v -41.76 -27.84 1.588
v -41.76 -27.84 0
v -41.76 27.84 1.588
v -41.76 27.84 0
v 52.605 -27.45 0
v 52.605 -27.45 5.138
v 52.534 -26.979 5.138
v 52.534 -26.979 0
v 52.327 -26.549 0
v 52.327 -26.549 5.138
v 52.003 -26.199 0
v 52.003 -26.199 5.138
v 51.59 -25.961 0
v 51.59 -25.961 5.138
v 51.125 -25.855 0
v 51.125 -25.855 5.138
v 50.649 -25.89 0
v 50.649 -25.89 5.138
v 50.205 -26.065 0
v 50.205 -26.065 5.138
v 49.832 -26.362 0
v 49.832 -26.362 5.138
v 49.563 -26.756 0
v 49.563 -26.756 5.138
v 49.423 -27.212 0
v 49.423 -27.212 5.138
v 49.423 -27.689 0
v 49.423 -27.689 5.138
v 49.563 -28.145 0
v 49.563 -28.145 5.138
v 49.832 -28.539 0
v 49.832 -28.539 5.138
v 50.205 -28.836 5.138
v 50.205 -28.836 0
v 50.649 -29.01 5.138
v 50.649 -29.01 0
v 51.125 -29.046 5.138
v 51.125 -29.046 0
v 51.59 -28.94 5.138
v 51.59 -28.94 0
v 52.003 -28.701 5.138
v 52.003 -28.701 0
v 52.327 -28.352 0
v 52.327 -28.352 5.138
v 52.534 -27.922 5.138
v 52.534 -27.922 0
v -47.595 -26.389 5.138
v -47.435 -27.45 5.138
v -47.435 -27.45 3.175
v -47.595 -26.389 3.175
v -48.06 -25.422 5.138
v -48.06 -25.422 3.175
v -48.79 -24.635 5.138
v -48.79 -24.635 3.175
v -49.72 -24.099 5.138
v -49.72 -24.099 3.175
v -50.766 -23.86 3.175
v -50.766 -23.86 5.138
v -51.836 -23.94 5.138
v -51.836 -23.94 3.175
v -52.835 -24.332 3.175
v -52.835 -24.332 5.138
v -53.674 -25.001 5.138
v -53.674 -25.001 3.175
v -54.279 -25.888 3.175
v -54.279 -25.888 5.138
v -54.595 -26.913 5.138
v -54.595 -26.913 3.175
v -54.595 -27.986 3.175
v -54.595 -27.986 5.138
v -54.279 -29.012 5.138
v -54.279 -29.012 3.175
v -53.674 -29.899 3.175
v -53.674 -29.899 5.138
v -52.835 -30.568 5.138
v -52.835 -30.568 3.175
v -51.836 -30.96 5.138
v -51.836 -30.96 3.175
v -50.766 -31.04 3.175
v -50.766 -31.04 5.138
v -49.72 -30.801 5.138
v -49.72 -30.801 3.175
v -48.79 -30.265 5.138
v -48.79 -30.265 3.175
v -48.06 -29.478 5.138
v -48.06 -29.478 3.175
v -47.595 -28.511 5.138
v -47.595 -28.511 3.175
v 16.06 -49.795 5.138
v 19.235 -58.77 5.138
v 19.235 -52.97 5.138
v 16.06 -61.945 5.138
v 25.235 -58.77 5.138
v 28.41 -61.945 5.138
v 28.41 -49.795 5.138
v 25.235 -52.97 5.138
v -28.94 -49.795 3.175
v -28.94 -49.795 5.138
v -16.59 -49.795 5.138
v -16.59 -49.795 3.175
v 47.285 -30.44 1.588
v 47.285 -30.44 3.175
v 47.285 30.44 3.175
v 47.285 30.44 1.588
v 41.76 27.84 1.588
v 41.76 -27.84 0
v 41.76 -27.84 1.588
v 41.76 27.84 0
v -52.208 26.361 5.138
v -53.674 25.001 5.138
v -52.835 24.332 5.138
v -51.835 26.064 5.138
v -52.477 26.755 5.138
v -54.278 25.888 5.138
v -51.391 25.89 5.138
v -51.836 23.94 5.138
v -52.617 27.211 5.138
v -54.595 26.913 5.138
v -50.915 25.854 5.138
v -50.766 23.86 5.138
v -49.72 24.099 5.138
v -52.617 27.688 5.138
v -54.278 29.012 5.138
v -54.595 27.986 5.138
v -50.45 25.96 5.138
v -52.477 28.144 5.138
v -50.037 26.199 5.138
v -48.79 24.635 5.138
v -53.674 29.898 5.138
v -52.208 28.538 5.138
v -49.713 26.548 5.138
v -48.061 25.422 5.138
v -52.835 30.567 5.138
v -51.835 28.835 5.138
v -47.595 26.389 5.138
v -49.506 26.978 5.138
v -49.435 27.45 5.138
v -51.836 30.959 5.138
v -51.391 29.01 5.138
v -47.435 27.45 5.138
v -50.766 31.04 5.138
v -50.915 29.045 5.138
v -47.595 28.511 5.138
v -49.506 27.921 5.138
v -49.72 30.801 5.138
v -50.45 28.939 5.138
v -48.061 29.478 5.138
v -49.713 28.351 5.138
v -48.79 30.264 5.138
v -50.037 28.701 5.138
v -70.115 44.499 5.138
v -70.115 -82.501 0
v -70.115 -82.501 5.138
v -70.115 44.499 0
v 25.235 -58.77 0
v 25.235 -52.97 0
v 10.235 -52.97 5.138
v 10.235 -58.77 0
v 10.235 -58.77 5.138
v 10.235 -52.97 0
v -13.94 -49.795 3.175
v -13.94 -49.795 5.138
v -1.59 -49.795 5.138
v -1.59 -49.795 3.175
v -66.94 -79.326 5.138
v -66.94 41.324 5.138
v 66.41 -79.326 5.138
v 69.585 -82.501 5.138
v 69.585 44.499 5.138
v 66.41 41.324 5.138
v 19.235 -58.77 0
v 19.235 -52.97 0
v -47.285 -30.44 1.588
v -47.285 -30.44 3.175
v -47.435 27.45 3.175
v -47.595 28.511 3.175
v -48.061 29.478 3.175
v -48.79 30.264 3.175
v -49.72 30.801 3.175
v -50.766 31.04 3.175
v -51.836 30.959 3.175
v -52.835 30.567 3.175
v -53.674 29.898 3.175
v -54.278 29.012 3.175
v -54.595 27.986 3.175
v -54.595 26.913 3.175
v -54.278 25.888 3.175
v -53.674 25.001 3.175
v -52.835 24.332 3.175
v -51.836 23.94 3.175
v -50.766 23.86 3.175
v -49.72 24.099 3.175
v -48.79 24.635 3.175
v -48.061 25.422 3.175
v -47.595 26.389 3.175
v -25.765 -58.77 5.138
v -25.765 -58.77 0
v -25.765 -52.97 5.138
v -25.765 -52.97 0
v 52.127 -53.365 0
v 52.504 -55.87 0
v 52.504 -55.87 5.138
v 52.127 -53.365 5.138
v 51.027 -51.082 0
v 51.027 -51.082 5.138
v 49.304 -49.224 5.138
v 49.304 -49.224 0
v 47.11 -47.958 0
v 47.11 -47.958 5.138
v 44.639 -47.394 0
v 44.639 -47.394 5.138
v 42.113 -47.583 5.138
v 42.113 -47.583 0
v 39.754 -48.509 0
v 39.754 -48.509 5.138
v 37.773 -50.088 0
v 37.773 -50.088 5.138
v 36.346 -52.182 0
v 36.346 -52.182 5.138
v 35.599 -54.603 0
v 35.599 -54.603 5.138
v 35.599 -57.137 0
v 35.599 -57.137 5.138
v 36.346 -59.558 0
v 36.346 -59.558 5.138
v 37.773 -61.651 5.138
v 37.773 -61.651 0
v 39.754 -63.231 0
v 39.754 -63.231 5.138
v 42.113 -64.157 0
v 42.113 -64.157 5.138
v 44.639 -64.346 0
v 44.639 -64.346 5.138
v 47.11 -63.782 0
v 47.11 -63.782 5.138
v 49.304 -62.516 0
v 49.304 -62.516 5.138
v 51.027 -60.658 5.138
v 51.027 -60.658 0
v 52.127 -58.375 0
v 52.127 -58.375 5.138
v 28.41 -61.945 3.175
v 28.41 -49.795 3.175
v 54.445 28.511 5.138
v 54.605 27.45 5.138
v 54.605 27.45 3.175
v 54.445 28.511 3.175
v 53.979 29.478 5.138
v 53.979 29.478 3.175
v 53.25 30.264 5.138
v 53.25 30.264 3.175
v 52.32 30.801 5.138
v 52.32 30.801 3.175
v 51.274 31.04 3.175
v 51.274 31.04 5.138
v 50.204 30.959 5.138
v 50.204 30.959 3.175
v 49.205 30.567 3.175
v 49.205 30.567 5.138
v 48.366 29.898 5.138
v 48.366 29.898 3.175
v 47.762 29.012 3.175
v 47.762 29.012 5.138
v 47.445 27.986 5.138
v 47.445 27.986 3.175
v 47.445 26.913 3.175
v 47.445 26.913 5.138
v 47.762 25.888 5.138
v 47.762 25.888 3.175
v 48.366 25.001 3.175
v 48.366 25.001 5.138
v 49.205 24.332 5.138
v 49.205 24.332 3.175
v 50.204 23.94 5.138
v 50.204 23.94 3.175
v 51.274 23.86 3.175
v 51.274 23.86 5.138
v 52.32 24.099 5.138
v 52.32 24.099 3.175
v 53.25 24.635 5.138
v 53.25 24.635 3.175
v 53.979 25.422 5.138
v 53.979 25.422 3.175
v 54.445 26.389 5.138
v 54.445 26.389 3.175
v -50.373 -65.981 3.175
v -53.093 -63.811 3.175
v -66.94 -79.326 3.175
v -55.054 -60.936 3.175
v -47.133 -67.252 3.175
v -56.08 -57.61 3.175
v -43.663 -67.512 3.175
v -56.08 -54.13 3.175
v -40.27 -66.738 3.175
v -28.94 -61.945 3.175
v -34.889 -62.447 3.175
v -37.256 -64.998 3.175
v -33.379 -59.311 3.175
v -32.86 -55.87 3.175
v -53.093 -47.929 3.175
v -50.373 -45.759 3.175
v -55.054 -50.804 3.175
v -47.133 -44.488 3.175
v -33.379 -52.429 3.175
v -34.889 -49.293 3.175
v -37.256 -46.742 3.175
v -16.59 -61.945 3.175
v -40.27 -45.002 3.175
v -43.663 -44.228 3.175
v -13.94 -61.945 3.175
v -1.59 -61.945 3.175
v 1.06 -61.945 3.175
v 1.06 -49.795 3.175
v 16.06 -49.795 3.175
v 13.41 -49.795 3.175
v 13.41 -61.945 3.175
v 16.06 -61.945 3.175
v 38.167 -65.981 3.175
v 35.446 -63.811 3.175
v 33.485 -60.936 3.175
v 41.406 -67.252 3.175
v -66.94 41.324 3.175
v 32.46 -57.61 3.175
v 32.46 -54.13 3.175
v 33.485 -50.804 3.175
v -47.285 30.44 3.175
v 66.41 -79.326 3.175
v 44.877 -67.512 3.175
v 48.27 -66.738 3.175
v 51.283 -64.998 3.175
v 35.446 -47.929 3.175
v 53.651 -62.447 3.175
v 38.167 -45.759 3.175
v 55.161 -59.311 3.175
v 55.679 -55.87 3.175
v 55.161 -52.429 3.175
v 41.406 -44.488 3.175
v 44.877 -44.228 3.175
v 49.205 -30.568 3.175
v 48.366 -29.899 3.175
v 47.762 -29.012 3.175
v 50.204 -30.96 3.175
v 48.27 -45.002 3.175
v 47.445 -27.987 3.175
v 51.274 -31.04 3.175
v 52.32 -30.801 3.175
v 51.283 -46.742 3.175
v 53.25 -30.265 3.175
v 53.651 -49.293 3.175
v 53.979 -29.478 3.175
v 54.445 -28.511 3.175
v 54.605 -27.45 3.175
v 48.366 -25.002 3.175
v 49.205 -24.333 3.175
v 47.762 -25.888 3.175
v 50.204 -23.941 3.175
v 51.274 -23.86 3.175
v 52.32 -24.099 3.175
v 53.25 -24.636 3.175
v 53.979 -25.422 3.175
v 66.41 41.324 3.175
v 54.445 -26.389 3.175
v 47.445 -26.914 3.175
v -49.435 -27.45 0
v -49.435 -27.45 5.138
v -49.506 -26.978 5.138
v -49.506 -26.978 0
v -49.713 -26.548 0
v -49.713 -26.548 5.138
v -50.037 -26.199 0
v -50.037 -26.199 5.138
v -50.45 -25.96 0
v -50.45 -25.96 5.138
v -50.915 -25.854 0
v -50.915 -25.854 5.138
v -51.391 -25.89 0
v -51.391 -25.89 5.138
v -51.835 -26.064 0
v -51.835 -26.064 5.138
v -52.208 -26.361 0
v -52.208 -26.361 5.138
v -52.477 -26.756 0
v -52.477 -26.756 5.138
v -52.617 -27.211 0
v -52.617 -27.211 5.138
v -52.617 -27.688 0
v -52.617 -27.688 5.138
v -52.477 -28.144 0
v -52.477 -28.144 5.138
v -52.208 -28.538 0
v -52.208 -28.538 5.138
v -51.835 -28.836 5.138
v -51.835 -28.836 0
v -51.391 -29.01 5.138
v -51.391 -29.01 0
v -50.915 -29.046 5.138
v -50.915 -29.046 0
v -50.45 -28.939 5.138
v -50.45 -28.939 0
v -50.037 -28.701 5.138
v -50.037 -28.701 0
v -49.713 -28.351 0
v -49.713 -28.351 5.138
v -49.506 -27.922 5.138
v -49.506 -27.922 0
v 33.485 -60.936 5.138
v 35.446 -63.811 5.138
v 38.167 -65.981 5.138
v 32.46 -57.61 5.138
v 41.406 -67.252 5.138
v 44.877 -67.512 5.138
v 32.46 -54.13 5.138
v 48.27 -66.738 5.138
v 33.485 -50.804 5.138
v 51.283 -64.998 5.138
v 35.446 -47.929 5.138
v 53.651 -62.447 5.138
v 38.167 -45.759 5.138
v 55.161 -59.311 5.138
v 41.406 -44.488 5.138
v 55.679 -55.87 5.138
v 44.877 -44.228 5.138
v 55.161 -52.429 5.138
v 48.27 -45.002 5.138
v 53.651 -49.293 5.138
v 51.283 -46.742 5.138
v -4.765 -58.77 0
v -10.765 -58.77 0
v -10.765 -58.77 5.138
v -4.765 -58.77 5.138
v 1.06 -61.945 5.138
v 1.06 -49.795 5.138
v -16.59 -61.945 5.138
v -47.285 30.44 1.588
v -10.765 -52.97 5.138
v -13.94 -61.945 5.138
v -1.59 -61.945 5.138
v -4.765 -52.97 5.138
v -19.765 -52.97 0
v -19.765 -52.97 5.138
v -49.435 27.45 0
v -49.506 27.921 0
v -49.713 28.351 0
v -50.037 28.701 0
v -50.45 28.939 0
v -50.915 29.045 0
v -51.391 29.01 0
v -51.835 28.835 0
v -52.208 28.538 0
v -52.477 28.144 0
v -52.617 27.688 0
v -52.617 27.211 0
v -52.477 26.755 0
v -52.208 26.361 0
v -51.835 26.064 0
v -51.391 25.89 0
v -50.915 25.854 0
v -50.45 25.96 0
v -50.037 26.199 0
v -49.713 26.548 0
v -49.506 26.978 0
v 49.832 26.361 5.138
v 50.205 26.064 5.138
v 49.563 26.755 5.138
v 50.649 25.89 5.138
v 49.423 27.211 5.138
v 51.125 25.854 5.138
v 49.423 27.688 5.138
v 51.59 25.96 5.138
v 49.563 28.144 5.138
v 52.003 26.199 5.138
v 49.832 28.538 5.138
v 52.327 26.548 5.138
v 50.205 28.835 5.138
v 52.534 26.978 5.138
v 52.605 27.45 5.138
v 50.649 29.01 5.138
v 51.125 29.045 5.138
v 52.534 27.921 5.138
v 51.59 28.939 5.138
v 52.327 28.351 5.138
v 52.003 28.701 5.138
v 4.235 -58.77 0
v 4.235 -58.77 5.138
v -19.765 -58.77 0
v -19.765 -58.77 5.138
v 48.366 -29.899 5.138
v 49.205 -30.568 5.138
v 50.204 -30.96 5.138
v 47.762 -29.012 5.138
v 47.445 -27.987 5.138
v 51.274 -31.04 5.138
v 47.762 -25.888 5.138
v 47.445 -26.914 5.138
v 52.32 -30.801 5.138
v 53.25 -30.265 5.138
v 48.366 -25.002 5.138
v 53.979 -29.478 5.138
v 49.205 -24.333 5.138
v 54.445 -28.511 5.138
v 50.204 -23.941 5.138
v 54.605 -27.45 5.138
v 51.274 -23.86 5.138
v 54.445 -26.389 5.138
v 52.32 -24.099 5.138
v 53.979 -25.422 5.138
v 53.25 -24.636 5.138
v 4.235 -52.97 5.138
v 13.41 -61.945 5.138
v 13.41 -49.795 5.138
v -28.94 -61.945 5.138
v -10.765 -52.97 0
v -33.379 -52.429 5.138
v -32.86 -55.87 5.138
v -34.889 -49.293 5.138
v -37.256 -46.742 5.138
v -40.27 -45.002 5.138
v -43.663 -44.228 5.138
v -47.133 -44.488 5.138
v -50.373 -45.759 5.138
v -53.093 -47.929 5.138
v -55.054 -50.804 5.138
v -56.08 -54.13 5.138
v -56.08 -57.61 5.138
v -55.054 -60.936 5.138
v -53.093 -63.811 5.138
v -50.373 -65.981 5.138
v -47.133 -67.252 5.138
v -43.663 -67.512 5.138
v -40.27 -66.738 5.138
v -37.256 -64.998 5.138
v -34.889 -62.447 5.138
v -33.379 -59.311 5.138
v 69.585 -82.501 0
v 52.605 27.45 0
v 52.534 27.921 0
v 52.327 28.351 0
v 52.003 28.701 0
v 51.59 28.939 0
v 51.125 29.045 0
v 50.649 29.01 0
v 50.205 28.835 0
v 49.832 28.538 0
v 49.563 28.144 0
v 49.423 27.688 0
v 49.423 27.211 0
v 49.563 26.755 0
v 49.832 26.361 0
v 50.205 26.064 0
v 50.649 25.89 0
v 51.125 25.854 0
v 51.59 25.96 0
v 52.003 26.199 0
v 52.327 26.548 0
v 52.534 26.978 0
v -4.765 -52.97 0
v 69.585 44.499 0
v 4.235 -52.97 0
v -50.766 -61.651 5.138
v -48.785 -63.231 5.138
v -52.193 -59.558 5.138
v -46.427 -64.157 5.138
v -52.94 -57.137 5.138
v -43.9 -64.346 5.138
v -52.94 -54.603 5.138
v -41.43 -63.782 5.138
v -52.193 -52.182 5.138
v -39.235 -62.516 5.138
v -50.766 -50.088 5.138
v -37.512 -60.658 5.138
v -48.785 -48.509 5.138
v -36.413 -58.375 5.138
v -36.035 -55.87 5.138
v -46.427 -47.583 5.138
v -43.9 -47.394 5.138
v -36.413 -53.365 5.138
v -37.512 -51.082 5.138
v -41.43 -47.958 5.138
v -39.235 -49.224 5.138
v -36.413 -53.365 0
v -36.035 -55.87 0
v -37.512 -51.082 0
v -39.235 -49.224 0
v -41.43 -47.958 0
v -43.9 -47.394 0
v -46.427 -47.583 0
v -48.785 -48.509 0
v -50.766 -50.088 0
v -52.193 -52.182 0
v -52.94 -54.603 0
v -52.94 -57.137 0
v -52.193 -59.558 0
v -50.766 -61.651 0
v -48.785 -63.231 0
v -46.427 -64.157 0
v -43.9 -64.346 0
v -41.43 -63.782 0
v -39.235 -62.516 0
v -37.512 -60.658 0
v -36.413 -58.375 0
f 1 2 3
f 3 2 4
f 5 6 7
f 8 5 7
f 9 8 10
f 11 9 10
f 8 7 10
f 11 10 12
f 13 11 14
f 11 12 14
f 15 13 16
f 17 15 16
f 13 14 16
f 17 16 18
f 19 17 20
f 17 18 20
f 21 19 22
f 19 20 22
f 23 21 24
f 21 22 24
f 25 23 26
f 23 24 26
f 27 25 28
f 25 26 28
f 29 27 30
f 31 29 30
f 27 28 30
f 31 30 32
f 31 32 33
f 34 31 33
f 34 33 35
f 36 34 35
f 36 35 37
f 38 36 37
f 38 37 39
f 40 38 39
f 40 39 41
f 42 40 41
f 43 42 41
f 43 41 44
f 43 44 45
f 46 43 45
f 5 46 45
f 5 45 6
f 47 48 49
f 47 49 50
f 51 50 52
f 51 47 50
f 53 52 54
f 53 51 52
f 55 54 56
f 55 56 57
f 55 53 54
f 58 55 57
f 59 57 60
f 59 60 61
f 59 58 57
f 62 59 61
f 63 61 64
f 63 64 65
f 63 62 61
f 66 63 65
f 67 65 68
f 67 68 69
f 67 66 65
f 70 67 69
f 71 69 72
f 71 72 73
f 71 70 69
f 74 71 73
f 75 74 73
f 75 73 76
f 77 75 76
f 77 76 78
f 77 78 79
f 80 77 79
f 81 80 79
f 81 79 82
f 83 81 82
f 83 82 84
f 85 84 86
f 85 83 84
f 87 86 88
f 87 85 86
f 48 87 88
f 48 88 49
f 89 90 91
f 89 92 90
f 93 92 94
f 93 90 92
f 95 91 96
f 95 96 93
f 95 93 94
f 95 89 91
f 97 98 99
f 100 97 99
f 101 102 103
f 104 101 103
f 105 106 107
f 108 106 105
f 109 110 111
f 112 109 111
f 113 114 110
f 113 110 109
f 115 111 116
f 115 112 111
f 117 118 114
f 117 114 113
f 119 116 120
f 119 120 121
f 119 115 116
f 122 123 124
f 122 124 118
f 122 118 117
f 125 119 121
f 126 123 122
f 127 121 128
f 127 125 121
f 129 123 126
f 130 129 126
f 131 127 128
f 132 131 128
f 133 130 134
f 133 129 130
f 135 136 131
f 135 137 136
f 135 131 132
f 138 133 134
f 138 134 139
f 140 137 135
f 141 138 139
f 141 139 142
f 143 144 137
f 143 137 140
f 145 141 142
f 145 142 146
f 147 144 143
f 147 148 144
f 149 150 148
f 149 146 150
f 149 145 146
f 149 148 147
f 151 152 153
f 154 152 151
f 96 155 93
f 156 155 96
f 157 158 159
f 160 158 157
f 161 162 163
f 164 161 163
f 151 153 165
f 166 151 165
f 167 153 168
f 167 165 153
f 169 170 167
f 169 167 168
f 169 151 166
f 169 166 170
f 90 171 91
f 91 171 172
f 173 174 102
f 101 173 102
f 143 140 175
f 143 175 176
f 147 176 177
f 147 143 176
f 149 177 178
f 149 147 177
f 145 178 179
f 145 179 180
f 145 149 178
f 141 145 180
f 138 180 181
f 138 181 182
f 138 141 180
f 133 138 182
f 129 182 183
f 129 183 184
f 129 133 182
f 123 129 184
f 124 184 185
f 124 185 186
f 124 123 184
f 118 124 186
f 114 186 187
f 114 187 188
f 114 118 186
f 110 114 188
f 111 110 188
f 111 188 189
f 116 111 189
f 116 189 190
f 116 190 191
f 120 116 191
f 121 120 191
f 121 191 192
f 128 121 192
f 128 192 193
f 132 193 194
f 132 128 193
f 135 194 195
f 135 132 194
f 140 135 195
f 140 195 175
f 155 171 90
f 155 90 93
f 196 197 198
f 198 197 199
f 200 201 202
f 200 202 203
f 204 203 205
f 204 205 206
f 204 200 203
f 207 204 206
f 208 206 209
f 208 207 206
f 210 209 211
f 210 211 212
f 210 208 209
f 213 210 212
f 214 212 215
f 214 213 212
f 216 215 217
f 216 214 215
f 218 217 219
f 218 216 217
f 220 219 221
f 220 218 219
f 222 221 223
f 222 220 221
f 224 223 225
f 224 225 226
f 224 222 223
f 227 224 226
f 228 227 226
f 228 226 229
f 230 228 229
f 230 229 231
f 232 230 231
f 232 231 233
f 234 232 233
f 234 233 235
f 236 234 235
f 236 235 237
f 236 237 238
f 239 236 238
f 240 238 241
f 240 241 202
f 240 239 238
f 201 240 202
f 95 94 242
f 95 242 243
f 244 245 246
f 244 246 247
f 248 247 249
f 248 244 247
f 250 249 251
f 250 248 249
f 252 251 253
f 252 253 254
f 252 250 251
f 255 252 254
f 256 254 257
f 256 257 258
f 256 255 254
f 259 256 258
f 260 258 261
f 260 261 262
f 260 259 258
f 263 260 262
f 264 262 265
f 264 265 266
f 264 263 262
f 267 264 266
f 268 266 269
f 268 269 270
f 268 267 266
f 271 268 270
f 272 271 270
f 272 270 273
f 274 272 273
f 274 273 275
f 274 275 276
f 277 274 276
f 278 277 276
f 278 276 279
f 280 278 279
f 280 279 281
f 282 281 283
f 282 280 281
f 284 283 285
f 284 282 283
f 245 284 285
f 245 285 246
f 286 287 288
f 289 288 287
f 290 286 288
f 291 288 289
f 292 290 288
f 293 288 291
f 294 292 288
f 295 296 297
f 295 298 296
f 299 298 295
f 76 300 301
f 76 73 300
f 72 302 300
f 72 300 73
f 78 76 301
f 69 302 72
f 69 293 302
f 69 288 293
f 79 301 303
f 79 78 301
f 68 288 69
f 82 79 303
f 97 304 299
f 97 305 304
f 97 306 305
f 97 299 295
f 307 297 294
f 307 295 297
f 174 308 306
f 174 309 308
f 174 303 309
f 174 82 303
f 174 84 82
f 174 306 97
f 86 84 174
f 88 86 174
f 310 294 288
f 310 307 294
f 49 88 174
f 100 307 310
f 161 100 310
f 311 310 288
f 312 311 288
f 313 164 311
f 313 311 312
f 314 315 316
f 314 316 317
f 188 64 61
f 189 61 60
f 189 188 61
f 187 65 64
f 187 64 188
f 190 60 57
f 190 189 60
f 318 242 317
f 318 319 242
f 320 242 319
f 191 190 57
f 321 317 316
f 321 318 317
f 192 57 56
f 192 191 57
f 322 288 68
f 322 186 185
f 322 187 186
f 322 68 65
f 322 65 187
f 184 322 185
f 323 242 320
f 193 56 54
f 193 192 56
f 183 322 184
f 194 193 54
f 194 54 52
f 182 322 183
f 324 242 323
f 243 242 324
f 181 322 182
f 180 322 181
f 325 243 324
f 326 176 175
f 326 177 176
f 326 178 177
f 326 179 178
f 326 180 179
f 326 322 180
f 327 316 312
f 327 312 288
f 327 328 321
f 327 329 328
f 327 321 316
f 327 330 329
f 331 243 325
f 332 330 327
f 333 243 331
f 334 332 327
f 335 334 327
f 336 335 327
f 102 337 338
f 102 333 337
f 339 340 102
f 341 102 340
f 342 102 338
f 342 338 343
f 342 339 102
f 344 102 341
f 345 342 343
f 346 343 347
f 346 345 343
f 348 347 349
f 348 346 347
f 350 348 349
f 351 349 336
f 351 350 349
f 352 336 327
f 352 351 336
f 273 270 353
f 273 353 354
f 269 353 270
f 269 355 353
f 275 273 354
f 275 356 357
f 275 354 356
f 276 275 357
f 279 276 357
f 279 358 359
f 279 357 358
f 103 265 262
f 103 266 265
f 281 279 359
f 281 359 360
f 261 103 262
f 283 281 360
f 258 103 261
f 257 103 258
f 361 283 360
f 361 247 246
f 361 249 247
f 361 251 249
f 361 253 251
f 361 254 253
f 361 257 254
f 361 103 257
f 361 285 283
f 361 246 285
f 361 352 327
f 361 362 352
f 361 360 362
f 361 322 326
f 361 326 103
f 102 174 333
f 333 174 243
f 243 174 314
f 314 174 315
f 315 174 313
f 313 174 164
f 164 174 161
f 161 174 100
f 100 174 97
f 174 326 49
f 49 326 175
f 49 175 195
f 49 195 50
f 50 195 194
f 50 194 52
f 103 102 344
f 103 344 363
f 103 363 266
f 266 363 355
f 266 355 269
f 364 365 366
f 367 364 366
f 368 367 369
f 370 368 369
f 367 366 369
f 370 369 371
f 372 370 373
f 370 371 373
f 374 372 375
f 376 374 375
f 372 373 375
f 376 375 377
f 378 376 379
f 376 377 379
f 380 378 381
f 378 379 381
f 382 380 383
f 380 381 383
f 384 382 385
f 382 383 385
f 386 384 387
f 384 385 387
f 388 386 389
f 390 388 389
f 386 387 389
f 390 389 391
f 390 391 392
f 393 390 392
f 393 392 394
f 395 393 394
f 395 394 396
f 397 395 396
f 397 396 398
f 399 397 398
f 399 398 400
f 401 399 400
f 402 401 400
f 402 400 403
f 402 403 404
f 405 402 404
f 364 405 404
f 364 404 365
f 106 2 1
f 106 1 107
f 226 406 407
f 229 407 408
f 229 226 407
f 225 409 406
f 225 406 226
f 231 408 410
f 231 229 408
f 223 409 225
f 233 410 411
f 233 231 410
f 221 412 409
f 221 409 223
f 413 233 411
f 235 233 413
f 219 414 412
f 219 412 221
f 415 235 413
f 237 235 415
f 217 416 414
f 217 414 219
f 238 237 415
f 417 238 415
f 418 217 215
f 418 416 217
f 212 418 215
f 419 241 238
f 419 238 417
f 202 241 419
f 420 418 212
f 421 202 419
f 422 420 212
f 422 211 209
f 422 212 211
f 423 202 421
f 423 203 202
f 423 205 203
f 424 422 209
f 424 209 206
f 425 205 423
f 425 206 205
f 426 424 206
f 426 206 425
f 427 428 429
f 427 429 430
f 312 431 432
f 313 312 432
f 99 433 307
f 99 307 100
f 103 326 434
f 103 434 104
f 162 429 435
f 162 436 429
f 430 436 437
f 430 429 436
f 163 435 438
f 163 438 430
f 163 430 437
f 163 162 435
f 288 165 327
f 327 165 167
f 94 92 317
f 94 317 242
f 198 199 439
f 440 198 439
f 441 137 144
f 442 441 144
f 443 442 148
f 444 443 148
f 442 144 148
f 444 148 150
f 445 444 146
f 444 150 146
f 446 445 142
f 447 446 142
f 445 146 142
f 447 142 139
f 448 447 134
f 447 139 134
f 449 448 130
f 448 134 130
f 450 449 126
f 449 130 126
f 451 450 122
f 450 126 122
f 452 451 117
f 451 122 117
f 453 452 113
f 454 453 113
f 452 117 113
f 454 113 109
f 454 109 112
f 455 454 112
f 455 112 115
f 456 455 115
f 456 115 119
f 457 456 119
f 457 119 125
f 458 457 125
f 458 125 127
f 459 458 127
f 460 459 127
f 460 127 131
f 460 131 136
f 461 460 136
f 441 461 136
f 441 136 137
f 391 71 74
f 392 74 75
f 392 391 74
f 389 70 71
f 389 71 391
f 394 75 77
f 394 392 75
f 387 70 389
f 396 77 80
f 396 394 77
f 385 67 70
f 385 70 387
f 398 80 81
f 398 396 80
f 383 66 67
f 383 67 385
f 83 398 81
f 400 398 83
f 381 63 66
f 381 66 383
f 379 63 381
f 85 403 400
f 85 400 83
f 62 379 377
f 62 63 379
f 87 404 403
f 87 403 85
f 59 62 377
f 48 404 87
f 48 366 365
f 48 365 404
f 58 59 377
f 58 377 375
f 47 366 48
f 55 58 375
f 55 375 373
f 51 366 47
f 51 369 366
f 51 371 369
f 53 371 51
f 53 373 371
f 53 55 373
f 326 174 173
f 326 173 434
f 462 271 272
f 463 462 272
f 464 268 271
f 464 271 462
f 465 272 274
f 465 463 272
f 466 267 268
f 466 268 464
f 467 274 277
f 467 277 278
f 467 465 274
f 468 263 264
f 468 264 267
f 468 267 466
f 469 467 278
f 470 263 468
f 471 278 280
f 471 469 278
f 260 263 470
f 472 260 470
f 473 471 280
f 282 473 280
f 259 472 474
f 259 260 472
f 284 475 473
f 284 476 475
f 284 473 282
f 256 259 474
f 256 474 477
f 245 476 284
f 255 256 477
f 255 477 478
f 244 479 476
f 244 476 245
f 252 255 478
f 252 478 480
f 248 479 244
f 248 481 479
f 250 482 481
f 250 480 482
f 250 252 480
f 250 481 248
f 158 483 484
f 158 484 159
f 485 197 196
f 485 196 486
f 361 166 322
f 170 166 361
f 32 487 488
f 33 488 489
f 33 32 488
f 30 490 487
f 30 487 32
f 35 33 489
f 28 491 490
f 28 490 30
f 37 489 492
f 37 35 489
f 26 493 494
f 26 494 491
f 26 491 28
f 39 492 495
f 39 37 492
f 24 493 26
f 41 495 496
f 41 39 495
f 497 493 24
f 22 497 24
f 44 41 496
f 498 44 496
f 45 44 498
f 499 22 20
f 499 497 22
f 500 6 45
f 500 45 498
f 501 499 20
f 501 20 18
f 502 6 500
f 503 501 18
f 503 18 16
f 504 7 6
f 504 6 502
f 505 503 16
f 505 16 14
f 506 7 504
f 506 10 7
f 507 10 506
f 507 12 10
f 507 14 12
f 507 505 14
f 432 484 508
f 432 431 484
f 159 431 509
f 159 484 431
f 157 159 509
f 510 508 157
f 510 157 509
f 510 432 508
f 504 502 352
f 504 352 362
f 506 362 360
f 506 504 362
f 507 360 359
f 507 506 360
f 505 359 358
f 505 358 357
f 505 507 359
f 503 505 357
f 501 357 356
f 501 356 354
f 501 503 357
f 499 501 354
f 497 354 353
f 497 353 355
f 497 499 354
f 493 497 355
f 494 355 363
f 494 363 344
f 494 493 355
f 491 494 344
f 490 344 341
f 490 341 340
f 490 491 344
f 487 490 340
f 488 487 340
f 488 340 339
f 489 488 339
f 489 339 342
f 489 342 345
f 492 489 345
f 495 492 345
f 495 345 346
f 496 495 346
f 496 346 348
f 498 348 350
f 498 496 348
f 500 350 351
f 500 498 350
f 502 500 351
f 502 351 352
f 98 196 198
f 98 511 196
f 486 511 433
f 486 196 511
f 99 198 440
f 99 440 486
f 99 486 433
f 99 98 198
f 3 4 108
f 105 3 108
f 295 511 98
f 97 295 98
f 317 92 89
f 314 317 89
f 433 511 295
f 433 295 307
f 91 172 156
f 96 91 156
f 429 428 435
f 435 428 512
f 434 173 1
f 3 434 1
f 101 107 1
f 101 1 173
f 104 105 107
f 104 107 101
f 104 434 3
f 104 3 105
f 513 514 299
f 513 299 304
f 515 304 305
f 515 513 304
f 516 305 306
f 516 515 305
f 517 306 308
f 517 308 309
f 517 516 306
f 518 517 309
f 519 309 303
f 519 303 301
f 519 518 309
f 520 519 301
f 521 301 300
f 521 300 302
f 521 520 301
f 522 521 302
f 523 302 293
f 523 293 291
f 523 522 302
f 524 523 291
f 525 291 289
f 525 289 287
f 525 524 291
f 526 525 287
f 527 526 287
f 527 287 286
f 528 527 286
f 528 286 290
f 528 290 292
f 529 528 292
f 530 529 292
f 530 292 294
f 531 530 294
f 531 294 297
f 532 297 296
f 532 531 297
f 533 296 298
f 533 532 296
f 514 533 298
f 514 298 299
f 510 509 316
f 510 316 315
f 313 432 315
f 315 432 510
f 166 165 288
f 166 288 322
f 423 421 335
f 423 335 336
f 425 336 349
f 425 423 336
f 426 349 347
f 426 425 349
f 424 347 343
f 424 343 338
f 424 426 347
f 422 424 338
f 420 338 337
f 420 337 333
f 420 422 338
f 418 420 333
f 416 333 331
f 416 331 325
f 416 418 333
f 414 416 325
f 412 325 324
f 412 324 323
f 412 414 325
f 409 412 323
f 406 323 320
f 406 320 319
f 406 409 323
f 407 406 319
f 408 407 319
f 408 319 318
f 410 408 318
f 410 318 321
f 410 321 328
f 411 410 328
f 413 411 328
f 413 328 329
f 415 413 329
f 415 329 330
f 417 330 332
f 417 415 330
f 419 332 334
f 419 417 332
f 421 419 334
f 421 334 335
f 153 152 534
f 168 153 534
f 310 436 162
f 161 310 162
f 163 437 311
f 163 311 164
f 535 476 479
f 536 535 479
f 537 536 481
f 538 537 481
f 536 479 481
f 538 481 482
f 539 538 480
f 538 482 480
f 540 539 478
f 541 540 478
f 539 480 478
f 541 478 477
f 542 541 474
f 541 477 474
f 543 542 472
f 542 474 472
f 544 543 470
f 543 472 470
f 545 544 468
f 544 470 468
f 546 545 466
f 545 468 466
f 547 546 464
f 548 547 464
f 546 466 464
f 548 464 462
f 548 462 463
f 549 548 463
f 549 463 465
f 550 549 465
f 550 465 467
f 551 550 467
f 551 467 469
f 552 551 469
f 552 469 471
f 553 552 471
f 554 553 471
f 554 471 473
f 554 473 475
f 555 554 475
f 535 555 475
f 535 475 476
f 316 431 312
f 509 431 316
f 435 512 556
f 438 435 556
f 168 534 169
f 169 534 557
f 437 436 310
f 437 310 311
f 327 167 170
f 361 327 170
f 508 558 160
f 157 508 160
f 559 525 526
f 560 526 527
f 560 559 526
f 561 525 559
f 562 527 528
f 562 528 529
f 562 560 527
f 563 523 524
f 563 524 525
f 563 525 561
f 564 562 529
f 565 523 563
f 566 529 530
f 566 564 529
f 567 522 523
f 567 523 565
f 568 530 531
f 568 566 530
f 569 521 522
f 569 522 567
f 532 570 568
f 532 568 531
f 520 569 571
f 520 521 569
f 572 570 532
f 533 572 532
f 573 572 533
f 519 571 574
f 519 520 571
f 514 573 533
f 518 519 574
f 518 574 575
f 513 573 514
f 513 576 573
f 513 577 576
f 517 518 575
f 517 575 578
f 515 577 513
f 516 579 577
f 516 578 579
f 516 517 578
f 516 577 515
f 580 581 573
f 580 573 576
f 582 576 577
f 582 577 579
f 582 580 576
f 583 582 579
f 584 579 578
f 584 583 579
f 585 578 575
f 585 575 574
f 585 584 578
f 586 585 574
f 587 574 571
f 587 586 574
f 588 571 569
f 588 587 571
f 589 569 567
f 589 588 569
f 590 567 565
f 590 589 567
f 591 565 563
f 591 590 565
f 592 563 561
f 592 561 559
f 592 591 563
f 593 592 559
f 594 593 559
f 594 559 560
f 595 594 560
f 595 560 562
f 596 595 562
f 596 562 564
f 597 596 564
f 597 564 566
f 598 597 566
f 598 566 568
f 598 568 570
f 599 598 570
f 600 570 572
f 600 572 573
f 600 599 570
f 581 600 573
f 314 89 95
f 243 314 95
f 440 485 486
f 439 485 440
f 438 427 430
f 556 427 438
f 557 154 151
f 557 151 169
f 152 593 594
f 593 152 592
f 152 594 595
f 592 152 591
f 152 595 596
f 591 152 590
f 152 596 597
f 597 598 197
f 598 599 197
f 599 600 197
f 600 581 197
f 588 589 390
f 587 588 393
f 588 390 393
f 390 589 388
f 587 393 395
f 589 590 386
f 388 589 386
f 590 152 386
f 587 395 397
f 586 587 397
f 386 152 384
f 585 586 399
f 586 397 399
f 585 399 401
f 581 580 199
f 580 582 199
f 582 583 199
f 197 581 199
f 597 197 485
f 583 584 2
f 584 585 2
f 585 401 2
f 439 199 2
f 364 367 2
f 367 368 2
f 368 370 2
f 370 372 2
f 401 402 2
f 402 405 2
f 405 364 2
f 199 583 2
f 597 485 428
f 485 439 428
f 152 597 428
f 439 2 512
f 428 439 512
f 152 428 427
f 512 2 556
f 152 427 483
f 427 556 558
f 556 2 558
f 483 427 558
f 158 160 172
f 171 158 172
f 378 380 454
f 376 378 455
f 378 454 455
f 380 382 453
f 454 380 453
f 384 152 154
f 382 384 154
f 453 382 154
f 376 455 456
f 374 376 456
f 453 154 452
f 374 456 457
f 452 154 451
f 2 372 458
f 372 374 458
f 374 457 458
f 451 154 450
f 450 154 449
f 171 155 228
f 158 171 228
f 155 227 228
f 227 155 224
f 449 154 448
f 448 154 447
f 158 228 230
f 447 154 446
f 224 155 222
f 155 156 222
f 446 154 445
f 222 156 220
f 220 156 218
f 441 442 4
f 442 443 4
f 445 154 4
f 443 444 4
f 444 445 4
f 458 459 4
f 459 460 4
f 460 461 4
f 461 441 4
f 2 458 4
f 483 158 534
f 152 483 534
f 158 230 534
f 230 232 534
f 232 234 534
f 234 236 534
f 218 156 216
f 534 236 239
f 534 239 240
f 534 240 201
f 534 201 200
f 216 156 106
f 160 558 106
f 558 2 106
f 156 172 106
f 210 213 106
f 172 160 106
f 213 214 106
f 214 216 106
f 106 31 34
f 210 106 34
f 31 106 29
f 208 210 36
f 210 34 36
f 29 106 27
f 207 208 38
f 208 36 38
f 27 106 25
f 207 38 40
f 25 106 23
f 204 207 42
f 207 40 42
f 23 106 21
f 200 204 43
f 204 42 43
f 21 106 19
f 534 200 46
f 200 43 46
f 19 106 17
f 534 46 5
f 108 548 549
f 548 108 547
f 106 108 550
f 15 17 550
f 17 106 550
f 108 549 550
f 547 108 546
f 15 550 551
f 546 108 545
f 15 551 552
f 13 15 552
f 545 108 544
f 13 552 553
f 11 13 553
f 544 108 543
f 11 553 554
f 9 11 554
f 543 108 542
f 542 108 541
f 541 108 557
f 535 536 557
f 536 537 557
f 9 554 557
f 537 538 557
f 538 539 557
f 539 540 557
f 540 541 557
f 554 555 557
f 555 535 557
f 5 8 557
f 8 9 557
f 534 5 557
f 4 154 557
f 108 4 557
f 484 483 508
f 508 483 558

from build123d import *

# Parameters (mm, degrees)
SKETCH1_W           = 139.7
SKETCH1_H           = 127
SKETCH1_R           = 8.5
SKETCH1_W_2         = 6
SKETCH1_H_2         = 5.8
SKETCH1_W_3         = 83.52
SKETCH1_H_3         = 55.68
BOSS_EXTRUDE1_DEPTH = 5.1375
SKETCH2_W           = 94.57
SKETCH2_H           = 60.88
SKETCH2_W_2         = 83.52
SKETCH2_H_2         = 55.68
CUT_EXTRUDE1_DEPTH  = 3.55
SKETCH3_R           = 1.6
SKETCH3_R_2         = 1.6002
CUT_EXTRUDE2_DEPTH  = 10
SKETCH4_W           = 133.35
SKETCH4_H           = 120.65
SKETCH4_R           = 3.6
SKETCH4_R_2         = 3.6002
SKETCH4_R_3         = 11.675
SKETCH4_W_2         = 12.35
SKETCH4_H_2         = 12.15
SKETCH4_W_3         = 94.57
SKETCH4_H_3         = 60.88
CUT_EXTRUDE3_DEPTH  = 1.9625


with BuildPart() as part:
    # Sketch1 → Boss-Extrude1 (new body)
    with BuildSketch(Plane.XY):
        with Locations((-0.265452364, -19.000597583)):
            Rectangle(SKETCH1_W, SKETCH1_H)
        with Locations((44.004207636, -55.869967583)):
            Circle(SKETCH1_R, mode=Mode.SUBTRACT)
        with Locations((-44.535112364, -55.869967583)):
            Circle(SKETCH1_R, mode=Mode.SUBTRACT)
        with Locations((-7.765452364, -55.869967583)):
            Rectangle(SKETCH1_W_2, SKETCH1_H_2, mode=Mode.SUBTRACT)
        Rectangle(SKETCH1_W_3, SKETCH1_H_3, mode=Mode.SUBTRACT)
        with Locations((-22.765452364, -55.869967583)):
            Rectangle(SKETCH1_W_2, SKETCH1_H_2, mode=Mode.SUBTRACT)
        with Locations((7.234547636, -55.869967583)):
            Rectangle(SKETCH1_W_2, SKETCH1_H_2, mode=Mode.SUBTRACT)
        with Locations((22.234547636, -55.869967583)):
            Rectangle(SKETCH1_W_2, SKETCH1_H_2, mode=Mode.SUBTRACT)
    extrude(amount=BOSS_EXTRUDE1_DEPTH)

    # Sketch2 → Cut-Extrude1 (cut)
    with BuildSketch(Plane.XY.offset(5.1375)):
        Rectangle(SKETCH2_W, SKETCH2_H)
        Rectangle(SKETCH2_W_2, SKETCH2_H_2, mode=Mode.SUBTRACT)
    extrude(amount=-CUT_EXTRUDE1_DEPTH, mode=Mode.SUBTRACT)

    # Sketch3 → Cut-Extrude2 (cut)
    with BuildSketch(Plane.XY.offset(5.1375)):
        with Locations((51.005027636, -27.450347583)):
            Circle(SKETCH3_R)
        with Locations((-51.034972364, 27.449652417)):
            Circle(SKETCH3_R)
        with Locations((51.005027636, 27.449652417)):
            Circle(SKETCH3_R)
        with Locations((-51.034972364, -27.449907583)):
            Circle(SKETCH3_R_2)
    extrude(amount=-CUT_EXTRUDE2_DEPTH, mode=Mode.SUBTRACT)

    # Sketch4 → Cut-Extrude3 (cut)
    with BuildSketch(Plane.XY.offset(5.1375)):
        with Locations((-0.265452364, -19.000597583)):
            Rectangle(SKETCH4_W, SKETCH4_H)
        with Locations((51.005027636, -27.450347583)):
            Circle(SKETCH4_R, mode=Mode.SUBTRACT)
        with Locations((-51.034972364, -27.449907583)):
            Circle(SKETCH4_R_2, mode=Mode.SUBTRACT)
        with Locations((-51.034972364, 27.449652417)):
            Circle(SKETCH4_R, mode=Mode.SUBTRACT)
        with Locations((51.005027636, 27.449652417)):
            Circle(SKETCH4_R, mode=Mode.SUBTRACT)
        with Locations((-44.535112364, -55.869967583)):
            Circle(SKETCH4_R_3, mode=Mode.SUBTRACT)
        with Locations((44.004207636, -55.869967583)):
            Circle(SKETCH4_R_3, mode=Mode.SUBTRACT)
        with Locations((22.234547636, -55.869967583)):
            Rectangle(SKETCH4_W_2, SKETCH4_H_2, mode=Mode.SUBTRACT)
        with Locations((-7.765452364, -55.869967583)):
            Rectangle(SKETCH4_W_2, SKETCH4_H_2, mode=Mode.SUBTRACT)
        with Locations((-22.765452364, -55.869967583)):
            Rectangle(SKETCH4_W_2, SKETCH4_H_2, mode=Mode.SUBTRACT)
        with Locations((7.234547636, -55.869967583)):
            Rectangle(SKETCH4_W_2, SKETCH4_H_2, mode=Mode.SUBTRACT)
        Rectangle(SKETCH4_W_3, SKETCH4_H_3, mode=Mode.SUBTRACT)
    extrude(amount=-CUT_EXTRUDE3_DEPTH, mode=Mode.SUBTRACT)


solid = part.part
